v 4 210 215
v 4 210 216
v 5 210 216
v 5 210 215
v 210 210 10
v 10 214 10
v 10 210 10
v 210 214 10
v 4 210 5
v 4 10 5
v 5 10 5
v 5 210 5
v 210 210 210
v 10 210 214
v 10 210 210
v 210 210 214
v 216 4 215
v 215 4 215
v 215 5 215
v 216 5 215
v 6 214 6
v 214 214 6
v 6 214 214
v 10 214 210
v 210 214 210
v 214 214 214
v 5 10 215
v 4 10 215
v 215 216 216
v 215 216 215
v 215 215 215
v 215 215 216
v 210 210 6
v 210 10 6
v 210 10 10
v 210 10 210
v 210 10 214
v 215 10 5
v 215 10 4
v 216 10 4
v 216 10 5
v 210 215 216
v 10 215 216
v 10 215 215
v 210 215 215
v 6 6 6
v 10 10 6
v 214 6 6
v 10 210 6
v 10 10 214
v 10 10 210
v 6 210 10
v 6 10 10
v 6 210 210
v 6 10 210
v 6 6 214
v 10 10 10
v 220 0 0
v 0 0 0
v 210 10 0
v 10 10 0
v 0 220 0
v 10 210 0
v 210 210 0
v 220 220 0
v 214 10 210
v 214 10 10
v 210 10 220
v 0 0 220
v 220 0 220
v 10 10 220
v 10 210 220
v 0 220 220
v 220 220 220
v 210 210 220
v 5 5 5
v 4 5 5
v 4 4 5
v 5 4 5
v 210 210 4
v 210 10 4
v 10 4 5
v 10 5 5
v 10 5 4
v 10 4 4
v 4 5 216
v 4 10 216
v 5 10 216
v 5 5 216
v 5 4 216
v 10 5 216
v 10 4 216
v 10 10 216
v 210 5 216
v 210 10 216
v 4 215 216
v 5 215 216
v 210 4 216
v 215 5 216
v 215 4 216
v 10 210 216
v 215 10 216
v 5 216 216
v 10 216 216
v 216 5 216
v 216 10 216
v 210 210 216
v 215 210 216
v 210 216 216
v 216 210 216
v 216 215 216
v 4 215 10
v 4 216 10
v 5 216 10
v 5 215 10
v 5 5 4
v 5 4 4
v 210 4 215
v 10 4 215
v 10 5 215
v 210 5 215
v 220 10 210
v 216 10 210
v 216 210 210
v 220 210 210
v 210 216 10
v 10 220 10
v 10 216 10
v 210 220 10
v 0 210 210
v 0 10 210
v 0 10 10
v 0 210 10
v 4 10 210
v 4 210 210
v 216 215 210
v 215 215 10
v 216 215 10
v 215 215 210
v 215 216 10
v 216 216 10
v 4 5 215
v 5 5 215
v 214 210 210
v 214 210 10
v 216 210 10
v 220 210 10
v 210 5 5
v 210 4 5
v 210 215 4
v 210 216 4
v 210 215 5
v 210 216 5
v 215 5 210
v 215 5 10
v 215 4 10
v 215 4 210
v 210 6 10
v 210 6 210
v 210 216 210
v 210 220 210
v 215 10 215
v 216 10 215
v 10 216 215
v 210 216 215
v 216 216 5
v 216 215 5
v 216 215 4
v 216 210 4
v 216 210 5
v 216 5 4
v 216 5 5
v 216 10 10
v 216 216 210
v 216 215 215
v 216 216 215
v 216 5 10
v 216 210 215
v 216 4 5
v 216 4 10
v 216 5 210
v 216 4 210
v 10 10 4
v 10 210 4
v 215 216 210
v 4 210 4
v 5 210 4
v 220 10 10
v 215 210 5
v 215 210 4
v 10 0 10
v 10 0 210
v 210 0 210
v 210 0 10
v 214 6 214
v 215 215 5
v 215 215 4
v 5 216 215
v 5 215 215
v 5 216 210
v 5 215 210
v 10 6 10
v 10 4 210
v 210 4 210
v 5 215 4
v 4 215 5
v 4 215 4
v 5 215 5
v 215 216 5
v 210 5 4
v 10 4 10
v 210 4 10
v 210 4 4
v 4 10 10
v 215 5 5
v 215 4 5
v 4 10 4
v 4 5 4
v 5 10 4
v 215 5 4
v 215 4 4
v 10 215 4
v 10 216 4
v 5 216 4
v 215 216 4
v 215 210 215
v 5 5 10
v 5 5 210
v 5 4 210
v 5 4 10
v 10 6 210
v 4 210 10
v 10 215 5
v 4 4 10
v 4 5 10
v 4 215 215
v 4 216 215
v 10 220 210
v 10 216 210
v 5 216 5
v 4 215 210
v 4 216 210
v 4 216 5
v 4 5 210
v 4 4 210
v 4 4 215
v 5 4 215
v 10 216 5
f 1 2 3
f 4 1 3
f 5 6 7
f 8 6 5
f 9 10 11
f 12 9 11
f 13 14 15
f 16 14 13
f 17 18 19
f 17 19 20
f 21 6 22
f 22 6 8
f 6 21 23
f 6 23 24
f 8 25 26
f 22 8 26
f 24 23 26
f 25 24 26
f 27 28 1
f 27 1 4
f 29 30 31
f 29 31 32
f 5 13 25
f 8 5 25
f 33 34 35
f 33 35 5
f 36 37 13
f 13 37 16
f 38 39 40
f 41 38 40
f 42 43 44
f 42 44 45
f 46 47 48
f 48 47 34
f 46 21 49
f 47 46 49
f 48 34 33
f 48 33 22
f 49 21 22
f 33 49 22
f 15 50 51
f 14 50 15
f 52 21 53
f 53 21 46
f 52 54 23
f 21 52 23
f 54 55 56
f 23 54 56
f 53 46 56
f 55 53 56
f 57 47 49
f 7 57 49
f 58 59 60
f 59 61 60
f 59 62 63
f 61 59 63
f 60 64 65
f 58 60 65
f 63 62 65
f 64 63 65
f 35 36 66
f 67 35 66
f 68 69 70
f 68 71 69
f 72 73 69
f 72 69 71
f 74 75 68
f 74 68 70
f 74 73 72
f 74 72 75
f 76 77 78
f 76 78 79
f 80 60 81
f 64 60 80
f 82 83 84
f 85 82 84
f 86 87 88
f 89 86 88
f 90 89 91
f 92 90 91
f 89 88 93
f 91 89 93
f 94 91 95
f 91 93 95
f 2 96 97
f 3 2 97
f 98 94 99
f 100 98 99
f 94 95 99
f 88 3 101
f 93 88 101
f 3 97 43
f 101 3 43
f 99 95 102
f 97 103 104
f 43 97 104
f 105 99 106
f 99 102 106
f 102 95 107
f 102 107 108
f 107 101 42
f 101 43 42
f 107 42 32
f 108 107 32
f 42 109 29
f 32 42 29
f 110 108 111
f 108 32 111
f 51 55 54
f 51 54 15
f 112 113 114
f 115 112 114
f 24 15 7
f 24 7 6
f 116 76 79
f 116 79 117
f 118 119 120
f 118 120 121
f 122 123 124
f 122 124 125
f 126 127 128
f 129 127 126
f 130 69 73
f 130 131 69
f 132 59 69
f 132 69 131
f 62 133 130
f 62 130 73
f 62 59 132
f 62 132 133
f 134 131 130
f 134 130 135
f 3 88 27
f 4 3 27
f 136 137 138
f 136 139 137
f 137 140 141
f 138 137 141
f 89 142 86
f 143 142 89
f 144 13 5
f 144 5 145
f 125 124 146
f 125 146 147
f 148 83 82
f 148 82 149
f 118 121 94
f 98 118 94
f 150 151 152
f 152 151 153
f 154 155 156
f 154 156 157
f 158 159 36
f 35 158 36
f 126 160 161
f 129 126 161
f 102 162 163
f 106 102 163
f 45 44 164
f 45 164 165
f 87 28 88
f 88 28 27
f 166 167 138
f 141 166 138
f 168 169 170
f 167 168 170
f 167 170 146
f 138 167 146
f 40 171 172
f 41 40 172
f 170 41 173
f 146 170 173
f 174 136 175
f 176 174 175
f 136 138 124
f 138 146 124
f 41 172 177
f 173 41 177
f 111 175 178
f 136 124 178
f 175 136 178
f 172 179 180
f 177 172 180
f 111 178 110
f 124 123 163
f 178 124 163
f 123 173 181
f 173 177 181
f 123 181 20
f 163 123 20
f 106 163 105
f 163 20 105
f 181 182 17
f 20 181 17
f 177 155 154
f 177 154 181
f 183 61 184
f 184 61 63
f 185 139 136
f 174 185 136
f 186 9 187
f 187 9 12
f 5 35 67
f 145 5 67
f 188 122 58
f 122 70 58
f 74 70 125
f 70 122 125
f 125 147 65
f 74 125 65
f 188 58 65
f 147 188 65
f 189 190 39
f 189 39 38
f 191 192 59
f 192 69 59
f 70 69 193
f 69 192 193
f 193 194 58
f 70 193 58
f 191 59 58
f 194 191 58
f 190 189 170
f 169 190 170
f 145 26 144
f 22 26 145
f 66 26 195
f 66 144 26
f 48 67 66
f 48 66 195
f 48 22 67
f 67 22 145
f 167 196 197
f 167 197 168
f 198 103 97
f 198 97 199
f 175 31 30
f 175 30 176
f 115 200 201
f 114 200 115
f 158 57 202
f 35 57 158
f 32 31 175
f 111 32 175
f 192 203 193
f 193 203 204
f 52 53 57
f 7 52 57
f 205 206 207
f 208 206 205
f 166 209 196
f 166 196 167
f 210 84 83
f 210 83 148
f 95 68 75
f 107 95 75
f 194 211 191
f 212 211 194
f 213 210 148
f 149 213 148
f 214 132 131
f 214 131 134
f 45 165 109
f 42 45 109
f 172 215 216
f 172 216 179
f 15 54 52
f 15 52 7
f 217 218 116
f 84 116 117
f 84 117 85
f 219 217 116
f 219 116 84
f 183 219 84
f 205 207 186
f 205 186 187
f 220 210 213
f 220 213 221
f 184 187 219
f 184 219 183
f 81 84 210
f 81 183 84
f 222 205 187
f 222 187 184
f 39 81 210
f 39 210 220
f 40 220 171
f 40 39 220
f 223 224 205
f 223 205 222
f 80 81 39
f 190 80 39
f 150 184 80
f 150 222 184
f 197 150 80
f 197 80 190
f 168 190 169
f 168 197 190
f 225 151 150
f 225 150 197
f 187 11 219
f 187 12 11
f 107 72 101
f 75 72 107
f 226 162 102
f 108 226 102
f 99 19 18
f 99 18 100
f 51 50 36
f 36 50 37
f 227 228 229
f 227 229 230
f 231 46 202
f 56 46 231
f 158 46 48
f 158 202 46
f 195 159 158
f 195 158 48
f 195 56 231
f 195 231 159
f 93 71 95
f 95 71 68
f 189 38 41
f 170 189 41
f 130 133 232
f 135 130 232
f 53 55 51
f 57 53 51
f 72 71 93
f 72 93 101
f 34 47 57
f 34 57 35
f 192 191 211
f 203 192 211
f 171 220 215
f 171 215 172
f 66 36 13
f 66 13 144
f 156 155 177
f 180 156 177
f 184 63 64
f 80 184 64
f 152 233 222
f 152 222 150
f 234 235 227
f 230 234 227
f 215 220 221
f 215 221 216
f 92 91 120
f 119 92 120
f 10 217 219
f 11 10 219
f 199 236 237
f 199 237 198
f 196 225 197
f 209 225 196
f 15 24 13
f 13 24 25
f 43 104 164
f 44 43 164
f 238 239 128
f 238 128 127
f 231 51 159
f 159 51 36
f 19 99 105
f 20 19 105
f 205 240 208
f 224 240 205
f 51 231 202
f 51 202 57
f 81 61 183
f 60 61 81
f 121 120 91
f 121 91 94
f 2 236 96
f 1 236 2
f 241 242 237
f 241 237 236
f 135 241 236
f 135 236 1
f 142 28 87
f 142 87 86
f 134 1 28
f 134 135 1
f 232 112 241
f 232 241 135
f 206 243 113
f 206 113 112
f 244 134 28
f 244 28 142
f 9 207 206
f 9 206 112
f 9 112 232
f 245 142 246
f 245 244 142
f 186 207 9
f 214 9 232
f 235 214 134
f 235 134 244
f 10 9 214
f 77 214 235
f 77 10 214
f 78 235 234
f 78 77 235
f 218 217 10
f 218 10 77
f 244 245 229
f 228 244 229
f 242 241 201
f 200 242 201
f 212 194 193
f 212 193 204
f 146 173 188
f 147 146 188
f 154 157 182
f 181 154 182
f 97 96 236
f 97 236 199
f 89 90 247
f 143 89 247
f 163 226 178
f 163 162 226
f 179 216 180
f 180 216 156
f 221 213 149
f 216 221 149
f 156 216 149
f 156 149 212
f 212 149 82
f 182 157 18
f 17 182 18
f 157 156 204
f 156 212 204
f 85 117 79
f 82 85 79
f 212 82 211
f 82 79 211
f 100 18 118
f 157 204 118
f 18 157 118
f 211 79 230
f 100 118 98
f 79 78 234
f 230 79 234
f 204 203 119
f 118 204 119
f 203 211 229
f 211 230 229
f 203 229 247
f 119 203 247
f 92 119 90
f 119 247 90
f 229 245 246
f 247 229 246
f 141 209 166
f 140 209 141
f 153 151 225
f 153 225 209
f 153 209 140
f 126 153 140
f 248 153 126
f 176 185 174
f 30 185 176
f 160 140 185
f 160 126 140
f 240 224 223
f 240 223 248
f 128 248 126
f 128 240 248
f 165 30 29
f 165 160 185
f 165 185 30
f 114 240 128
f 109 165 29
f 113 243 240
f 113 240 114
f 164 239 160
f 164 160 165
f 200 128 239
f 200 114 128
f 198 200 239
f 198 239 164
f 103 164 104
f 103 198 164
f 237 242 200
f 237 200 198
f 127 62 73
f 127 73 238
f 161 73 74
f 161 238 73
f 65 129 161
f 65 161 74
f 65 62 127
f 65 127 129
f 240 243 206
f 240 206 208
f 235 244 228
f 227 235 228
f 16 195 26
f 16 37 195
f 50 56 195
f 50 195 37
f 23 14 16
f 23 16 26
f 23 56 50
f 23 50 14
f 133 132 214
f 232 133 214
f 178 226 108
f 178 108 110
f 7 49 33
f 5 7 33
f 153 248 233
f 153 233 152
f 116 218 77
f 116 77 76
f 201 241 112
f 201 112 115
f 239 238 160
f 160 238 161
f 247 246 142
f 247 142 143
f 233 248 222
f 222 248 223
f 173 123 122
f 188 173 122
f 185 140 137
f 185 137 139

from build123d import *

# Parameters (mm, degrees)
CROQUIS1_W            = 220
CROQUIS1_H            = 220
CROQUIS1_W_2          = 200
CROQUIS1_H_2          = 200
MARCOBASE_DEPTH       = 10
CROQUIS2_W            = 10
CROQUIS2_H            = 10
PILARES_DEPTH         = 210
CROQUIS3_W            = 220
CROQUIS3_H            = 220
CROQUIS3_W_2          = 200
CROQUIS3_H_2          = 200
EXTERIOR_DEPTH        = 10
CROQUIS8_W            = 212
CROQUIS8_H            = 212
CROQUIS8_W_2          = 208
CROQUIS8_H_2          = 208
CORTAR_EXTRUIR5_DEPTH = 5
MATRIZC1_COUNT        = 4
MATRIZC2_COUNT        = 4


with BuildPart() as part:
    # Croquis1 → MarcoBase (new body)
    with BuildSketch(Plane.XY):
        with Locations((110, 110)):
            Rectangle(CROQUIS1_W, CROQUIS1_H)
        with Locations((110, 110)):
            Rectangle(CROQUIS1_W_2, CROQUIS1_H_2, mode=Mode.SUBTRACT)
    extrude(amount=MARCOBASE_DEPTH)

    # Croquis2 → Pilares (add)
    with BuildSketch(Plane.XY.offset(10)):
        with Locations((5, 215)):
            Rectangle(CROQUIS2_W, CROQUIS2_H)
        with Locations((215, 215)):
            Rectangle(CROQUIS2_W, CROQUIS2_H)
        with Locations((215, 5)):
            Rectangle(CROQUIS2_W, CROQUIS2_H)
        with Locations((5, 5)):
            Rectangle(CROQUIS2_W, CROQUIS2_H)
    extrude(amount=PILARES_DEPTH)

    # Croquis3 → Exterior (add)
    with BuildSketch(Plane.XY.offset(220)):
        with Locations((110, 110)):
            Rectangle(CROQUIS3_W, CROQUIS3_H)
        with Locations((110, 110)):
            Rectangle(CROQUIS3_W_2, CROQUIS3_H_2, mode=Mode.SUBTRACT)
    extrude(amount=-EXTERIOR_DEPTH)

    # Croquis8 → Cortar-Extruir5 (cut)
    with BuildSketch(Plane.XY.offset(10)):
        with Locations((110, 110)):
            Rectangle(CROQUIS8_W, CROQUIS8_H)
        with Locations((110, 110)):
            Rectangle(CROQUIS8_W_2, CROQUIS8_H_2, mode=Mode.SUBTRACT)
    cortar_extruir5 = extrude(amount=-CORTAR_EXTRUIR5_DEPTH, mode=Mode.SUBTRACT)

    # MatrizC1: Cortar-Extruir5 ×4 about axis
    matrizc1_axis = Axis((262.5, 110, 110), (-1, 0, 0))
    for i in range(1, MATRIZC1_COUNT):
        add(cortar_extruir5.rotate(matrizc1_axis, i * 360 / MATRIZC1_COUNT), mode=Mode.SUBTRACT)

    # MatrizC2: Cortar-Extruir5 ×4 about axis
    matrizc2_axis = Axis((110, 262.5, 110), (0, -1, 0))
    for i in range(1, MATRIZC2_COUNT):
        add(cortar_extruir5.rotate(matrizc2_axis, i * 360 / MATRIZC2_COUNT), mode=Mode.SUBTRACT)


solid = part.part
